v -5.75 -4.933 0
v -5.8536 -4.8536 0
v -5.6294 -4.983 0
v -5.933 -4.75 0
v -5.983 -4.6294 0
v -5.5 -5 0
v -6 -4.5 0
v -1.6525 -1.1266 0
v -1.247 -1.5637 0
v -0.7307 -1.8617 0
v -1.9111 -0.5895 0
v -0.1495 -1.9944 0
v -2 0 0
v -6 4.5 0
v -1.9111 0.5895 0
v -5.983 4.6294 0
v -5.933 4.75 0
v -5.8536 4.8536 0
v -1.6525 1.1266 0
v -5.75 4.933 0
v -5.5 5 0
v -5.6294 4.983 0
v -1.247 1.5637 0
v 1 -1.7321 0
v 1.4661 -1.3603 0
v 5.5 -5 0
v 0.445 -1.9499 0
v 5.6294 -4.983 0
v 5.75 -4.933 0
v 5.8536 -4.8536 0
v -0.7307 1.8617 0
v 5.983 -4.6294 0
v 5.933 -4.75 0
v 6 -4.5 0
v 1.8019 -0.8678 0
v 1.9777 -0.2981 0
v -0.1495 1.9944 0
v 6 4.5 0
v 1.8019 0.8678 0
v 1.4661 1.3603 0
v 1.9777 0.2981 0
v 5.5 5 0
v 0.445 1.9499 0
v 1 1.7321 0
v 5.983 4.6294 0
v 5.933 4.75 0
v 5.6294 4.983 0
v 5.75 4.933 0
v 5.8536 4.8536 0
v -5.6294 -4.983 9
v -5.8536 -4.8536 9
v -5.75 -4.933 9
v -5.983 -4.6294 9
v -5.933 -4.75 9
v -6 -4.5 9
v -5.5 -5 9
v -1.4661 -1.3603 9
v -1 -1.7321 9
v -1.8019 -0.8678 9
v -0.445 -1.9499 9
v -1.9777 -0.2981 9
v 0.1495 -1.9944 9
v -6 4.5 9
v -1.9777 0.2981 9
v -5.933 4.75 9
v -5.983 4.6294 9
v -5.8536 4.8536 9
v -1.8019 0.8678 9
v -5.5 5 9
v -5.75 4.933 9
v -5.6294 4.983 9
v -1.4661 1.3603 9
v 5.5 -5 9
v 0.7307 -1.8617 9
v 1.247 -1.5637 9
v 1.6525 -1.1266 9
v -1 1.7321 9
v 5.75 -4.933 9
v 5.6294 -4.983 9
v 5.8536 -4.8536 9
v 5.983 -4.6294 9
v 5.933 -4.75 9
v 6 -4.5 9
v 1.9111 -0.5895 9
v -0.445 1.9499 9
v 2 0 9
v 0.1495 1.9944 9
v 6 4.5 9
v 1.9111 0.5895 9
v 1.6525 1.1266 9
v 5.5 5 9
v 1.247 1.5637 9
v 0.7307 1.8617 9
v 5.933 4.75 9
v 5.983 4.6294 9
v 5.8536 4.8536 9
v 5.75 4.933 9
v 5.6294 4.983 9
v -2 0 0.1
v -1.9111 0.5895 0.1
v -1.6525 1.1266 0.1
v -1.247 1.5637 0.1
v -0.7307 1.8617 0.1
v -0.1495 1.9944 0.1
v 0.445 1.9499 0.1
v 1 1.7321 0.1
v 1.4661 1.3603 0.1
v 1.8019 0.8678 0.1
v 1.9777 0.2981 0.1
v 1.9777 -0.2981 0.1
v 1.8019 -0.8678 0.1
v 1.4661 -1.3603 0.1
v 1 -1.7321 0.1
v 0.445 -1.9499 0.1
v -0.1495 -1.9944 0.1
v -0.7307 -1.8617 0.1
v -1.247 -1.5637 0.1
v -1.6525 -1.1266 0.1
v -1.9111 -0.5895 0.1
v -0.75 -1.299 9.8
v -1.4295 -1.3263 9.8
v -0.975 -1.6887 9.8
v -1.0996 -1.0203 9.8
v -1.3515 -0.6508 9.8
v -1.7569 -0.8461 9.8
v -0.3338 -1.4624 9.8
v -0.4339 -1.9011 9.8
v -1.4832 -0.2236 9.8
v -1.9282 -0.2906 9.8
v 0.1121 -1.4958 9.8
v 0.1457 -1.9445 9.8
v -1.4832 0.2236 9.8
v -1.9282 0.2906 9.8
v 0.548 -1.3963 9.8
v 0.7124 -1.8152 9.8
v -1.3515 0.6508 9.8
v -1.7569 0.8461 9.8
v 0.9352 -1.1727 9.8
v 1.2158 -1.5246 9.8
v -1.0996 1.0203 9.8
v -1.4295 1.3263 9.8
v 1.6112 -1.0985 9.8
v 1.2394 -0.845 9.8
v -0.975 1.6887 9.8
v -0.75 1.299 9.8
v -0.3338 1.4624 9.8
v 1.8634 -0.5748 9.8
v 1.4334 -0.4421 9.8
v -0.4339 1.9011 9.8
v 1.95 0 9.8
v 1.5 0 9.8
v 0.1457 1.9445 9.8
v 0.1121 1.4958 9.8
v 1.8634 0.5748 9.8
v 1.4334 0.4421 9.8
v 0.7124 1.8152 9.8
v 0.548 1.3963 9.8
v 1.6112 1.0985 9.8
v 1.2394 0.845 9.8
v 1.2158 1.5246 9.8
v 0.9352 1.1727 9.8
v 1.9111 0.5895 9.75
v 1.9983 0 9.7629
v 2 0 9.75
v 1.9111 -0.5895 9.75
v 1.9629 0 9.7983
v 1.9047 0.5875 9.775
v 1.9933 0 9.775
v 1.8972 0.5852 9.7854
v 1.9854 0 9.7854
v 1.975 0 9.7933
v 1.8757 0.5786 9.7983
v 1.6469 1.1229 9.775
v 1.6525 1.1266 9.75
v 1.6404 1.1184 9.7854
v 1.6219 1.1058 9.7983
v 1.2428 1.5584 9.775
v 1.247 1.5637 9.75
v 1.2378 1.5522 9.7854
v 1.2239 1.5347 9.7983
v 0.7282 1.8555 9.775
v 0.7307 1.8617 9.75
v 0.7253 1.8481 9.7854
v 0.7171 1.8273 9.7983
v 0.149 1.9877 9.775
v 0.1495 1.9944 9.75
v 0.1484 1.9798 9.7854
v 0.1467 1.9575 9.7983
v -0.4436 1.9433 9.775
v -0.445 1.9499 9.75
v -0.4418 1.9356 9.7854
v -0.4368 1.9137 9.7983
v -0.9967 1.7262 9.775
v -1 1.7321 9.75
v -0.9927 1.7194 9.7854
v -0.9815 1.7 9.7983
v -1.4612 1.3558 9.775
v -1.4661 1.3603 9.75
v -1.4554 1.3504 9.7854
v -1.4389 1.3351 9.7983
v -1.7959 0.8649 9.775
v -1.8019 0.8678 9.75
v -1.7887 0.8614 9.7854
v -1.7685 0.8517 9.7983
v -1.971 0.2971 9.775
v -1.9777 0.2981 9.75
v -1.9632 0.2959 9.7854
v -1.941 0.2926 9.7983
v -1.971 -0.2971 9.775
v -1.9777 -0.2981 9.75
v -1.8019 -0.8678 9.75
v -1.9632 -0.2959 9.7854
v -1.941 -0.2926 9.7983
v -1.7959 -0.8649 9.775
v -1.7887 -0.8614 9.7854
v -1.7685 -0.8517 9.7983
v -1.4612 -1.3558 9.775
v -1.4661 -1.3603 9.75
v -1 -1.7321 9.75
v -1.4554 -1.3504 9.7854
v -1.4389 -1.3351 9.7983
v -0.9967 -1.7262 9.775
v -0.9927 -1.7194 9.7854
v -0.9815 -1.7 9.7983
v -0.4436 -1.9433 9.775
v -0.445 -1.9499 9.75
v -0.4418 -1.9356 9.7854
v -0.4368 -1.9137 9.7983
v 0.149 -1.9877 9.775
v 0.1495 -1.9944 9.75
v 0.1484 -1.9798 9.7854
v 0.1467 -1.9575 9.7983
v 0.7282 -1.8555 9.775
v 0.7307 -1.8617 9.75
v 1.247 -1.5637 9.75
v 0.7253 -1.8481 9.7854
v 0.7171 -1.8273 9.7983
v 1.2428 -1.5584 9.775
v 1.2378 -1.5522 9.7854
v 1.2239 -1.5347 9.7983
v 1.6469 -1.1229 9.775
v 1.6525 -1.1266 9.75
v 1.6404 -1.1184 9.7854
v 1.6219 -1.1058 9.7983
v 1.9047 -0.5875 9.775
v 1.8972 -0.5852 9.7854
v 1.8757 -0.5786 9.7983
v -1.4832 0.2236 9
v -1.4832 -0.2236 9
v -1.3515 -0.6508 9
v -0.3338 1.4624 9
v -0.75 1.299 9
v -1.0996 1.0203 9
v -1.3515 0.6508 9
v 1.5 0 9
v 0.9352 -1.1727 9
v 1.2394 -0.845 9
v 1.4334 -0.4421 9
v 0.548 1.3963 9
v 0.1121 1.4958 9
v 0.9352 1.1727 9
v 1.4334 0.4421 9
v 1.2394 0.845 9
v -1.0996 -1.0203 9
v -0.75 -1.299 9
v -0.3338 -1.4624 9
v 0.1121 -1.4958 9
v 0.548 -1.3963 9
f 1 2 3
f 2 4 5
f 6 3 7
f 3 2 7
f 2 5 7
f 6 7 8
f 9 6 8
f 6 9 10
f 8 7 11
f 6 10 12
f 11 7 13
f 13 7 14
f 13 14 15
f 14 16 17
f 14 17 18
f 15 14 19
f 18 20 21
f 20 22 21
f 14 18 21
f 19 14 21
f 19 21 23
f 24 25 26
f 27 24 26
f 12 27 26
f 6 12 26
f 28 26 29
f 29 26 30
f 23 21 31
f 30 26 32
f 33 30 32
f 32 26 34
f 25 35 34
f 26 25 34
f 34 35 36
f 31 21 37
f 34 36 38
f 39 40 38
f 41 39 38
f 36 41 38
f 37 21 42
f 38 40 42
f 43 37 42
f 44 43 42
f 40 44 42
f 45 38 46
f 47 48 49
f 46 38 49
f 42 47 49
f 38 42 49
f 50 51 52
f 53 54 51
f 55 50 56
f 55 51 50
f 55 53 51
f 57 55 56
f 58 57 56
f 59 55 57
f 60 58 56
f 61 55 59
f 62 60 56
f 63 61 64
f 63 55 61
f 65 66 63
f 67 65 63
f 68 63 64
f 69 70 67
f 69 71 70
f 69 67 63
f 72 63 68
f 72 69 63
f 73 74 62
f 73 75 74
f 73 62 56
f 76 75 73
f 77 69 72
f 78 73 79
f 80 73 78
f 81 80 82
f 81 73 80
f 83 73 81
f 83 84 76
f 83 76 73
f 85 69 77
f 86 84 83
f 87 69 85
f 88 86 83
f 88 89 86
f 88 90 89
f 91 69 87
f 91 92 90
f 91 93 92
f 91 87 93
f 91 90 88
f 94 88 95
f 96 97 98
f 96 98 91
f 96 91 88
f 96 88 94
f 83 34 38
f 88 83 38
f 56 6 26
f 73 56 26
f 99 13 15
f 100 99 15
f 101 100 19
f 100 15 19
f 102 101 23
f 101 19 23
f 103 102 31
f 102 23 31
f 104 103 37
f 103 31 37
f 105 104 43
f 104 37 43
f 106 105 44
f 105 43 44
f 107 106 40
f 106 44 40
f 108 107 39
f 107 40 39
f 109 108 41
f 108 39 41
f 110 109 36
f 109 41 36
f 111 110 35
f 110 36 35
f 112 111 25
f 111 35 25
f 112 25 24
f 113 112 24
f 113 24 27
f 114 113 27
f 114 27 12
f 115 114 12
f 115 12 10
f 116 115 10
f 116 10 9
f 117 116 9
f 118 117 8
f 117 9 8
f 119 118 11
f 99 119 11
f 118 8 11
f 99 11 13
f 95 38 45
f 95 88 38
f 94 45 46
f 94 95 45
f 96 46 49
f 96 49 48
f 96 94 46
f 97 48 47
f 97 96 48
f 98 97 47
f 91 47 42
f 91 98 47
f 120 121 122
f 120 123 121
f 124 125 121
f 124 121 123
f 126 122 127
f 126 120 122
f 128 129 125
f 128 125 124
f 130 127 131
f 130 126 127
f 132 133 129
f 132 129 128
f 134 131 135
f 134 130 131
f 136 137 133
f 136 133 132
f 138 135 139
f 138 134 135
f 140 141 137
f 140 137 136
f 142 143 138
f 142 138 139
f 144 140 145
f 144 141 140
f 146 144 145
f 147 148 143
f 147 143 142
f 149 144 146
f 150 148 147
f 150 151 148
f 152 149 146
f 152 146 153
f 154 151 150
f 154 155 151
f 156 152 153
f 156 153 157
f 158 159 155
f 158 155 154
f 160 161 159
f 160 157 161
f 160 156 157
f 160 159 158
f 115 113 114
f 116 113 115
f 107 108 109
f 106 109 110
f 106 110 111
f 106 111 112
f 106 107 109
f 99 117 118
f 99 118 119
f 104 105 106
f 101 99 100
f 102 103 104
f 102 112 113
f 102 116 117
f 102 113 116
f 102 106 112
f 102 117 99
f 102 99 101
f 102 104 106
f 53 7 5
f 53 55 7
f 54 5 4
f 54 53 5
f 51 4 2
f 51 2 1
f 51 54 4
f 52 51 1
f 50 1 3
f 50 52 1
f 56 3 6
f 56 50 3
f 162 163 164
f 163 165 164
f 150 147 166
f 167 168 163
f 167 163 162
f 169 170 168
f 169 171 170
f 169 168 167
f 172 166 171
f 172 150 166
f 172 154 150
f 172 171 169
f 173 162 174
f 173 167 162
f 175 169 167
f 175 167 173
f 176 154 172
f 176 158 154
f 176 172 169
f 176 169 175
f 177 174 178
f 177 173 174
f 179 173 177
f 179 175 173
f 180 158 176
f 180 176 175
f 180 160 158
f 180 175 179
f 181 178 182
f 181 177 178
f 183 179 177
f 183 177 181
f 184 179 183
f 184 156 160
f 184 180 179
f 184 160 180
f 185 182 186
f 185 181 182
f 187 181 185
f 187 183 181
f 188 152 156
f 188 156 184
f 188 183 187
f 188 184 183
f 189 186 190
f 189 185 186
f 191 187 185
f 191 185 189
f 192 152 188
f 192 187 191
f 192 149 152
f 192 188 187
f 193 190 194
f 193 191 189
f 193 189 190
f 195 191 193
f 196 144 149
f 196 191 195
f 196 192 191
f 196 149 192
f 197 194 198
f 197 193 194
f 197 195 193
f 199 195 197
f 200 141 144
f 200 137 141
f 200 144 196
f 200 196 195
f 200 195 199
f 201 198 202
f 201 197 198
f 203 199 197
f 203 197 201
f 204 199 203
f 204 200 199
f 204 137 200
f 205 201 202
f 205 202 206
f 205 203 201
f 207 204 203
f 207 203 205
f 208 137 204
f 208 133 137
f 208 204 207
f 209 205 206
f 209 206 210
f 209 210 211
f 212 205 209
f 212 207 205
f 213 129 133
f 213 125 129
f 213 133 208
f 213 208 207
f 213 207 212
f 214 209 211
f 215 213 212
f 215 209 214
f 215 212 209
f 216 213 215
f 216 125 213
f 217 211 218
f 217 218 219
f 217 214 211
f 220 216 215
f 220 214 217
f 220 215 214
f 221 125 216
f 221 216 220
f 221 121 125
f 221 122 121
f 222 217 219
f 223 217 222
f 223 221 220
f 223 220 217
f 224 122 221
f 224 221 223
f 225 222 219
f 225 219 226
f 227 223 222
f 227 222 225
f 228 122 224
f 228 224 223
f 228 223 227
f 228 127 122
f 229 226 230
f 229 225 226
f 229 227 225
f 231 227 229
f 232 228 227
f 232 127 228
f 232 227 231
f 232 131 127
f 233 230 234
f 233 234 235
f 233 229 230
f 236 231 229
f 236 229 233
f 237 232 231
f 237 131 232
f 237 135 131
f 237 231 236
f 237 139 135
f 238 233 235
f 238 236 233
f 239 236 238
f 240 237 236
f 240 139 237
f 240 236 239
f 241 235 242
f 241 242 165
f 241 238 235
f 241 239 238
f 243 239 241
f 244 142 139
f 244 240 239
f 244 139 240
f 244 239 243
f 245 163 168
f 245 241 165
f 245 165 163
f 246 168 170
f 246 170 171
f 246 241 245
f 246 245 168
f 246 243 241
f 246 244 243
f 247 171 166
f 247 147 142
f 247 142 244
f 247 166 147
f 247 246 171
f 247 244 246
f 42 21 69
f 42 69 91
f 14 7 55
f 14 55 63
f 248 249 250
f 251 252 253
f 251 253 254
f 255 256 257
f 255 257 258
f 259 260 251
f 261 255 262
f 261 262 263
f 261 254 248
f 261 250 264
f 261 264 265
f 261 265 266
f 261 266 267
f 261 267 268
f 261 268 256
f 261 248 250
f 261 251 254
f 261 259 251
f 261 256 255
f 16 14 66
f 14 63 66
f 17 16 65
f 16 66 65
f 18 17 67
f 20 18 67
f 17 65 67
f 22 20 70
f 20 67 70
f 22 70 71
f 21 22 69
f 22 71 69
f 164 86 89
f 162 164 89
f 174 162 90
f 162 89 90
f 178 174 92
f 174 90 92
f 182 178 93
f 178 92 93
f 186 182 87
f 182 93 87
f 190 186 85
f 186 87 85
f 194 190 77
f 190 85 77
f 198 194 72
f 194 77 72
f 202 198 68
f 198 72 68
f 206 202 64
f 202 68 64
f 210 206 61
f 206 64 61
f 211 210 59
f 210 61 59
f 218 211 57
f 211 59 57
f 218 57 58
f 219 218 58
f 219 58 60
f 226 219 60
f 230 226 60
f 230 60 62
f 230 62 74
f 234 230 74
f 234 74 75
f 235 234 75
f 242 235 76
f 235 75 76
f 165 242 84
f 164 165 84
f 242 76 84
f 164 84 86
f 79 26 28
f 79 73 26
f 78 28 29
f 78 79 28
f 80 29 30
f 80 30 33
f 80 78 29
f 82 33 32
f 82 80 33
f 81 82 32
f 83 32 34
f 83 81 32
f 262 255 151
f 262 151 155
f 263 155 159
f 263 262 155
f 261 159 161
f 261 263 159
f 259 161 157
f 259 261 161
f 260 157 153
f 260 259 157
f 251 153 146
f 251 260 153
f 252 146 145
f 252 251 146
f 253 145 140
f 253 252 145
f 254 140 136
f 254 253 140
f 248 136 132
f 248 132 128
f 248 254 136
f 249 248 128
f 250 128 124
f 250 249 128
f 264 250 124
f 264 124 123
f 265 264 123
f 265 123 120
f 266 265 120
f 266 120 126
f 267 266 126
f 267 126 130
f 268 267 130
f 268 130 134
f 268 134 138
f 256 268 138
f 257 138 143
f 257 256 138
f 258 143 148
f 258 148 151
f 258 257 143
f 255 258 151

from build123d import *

# Parameters (mm, degrees)
SKETCH_1_W          = 12
SKETCH_1_H          = 10
EXTRUDE_1_DEPTH     = 9
FILLET_1_R          = 0.5
SKETCH_2_R          = 2
SKETCH_2_R_2        = 1.5
EXTRUDE_2_DEPTH     = 0.8
FILLET_2_R          = 0.05
SKETCH_7_R          = 2
CUT_EXTRUDE_4_DEPTH = 0.1


with BuildPart() as part:
    # 草图1 → 凸台-拉伸1 (new body)
    with BuildSketch(Plane.XY):
        Rectangle(SKETCH_1_W, SKETCH_1_H)
    extrude(amount=EXTRUDE_1_DEPTH)

    # 圆角1
    fillet_1_edges = [part.edges().sort_by_distance(p)[0] for p in [
        (6, -5, 4.5),
        (-6, -5, 4.5),
        (-6, 5, 4.5),
        (6, 5, 4.5),
    ]]
    fillet(fillet_1_edges, radius=FILLET_1_R)

    # 草图2 → 凸台-拉伸2 (add)
    with BuildSketch(Plane.XY.offset(9)):
        Circle(SKETCH_2_R)
        Circle(SKETCH_2_R_2, mode=Mode.SUBTRACT)
    extrude(amount=EXTRUDE_2_DEPTH)

    # 圆角2
    fillet_2_edges = [part.edges().sort_by_distance(p)[0] for p in [
        (-2, 0, 9.8),
    ]]
    fillet(fillet_2_edges, radius=FILLET_2_R)

    # 草图7 → 切除-拉伸4 (cut)
    with BuildSketch(Plane(origin=(0, 0, 0), x_dir=(-1, 0, 0), z_dir=(0, 0, -1))):
        Circle(SKETCH_7_R)
    extrude(amount=-CUT_EXTRUDE_4_DEPTH, mode=Mode.SUBTRACT)


solid = part.part
